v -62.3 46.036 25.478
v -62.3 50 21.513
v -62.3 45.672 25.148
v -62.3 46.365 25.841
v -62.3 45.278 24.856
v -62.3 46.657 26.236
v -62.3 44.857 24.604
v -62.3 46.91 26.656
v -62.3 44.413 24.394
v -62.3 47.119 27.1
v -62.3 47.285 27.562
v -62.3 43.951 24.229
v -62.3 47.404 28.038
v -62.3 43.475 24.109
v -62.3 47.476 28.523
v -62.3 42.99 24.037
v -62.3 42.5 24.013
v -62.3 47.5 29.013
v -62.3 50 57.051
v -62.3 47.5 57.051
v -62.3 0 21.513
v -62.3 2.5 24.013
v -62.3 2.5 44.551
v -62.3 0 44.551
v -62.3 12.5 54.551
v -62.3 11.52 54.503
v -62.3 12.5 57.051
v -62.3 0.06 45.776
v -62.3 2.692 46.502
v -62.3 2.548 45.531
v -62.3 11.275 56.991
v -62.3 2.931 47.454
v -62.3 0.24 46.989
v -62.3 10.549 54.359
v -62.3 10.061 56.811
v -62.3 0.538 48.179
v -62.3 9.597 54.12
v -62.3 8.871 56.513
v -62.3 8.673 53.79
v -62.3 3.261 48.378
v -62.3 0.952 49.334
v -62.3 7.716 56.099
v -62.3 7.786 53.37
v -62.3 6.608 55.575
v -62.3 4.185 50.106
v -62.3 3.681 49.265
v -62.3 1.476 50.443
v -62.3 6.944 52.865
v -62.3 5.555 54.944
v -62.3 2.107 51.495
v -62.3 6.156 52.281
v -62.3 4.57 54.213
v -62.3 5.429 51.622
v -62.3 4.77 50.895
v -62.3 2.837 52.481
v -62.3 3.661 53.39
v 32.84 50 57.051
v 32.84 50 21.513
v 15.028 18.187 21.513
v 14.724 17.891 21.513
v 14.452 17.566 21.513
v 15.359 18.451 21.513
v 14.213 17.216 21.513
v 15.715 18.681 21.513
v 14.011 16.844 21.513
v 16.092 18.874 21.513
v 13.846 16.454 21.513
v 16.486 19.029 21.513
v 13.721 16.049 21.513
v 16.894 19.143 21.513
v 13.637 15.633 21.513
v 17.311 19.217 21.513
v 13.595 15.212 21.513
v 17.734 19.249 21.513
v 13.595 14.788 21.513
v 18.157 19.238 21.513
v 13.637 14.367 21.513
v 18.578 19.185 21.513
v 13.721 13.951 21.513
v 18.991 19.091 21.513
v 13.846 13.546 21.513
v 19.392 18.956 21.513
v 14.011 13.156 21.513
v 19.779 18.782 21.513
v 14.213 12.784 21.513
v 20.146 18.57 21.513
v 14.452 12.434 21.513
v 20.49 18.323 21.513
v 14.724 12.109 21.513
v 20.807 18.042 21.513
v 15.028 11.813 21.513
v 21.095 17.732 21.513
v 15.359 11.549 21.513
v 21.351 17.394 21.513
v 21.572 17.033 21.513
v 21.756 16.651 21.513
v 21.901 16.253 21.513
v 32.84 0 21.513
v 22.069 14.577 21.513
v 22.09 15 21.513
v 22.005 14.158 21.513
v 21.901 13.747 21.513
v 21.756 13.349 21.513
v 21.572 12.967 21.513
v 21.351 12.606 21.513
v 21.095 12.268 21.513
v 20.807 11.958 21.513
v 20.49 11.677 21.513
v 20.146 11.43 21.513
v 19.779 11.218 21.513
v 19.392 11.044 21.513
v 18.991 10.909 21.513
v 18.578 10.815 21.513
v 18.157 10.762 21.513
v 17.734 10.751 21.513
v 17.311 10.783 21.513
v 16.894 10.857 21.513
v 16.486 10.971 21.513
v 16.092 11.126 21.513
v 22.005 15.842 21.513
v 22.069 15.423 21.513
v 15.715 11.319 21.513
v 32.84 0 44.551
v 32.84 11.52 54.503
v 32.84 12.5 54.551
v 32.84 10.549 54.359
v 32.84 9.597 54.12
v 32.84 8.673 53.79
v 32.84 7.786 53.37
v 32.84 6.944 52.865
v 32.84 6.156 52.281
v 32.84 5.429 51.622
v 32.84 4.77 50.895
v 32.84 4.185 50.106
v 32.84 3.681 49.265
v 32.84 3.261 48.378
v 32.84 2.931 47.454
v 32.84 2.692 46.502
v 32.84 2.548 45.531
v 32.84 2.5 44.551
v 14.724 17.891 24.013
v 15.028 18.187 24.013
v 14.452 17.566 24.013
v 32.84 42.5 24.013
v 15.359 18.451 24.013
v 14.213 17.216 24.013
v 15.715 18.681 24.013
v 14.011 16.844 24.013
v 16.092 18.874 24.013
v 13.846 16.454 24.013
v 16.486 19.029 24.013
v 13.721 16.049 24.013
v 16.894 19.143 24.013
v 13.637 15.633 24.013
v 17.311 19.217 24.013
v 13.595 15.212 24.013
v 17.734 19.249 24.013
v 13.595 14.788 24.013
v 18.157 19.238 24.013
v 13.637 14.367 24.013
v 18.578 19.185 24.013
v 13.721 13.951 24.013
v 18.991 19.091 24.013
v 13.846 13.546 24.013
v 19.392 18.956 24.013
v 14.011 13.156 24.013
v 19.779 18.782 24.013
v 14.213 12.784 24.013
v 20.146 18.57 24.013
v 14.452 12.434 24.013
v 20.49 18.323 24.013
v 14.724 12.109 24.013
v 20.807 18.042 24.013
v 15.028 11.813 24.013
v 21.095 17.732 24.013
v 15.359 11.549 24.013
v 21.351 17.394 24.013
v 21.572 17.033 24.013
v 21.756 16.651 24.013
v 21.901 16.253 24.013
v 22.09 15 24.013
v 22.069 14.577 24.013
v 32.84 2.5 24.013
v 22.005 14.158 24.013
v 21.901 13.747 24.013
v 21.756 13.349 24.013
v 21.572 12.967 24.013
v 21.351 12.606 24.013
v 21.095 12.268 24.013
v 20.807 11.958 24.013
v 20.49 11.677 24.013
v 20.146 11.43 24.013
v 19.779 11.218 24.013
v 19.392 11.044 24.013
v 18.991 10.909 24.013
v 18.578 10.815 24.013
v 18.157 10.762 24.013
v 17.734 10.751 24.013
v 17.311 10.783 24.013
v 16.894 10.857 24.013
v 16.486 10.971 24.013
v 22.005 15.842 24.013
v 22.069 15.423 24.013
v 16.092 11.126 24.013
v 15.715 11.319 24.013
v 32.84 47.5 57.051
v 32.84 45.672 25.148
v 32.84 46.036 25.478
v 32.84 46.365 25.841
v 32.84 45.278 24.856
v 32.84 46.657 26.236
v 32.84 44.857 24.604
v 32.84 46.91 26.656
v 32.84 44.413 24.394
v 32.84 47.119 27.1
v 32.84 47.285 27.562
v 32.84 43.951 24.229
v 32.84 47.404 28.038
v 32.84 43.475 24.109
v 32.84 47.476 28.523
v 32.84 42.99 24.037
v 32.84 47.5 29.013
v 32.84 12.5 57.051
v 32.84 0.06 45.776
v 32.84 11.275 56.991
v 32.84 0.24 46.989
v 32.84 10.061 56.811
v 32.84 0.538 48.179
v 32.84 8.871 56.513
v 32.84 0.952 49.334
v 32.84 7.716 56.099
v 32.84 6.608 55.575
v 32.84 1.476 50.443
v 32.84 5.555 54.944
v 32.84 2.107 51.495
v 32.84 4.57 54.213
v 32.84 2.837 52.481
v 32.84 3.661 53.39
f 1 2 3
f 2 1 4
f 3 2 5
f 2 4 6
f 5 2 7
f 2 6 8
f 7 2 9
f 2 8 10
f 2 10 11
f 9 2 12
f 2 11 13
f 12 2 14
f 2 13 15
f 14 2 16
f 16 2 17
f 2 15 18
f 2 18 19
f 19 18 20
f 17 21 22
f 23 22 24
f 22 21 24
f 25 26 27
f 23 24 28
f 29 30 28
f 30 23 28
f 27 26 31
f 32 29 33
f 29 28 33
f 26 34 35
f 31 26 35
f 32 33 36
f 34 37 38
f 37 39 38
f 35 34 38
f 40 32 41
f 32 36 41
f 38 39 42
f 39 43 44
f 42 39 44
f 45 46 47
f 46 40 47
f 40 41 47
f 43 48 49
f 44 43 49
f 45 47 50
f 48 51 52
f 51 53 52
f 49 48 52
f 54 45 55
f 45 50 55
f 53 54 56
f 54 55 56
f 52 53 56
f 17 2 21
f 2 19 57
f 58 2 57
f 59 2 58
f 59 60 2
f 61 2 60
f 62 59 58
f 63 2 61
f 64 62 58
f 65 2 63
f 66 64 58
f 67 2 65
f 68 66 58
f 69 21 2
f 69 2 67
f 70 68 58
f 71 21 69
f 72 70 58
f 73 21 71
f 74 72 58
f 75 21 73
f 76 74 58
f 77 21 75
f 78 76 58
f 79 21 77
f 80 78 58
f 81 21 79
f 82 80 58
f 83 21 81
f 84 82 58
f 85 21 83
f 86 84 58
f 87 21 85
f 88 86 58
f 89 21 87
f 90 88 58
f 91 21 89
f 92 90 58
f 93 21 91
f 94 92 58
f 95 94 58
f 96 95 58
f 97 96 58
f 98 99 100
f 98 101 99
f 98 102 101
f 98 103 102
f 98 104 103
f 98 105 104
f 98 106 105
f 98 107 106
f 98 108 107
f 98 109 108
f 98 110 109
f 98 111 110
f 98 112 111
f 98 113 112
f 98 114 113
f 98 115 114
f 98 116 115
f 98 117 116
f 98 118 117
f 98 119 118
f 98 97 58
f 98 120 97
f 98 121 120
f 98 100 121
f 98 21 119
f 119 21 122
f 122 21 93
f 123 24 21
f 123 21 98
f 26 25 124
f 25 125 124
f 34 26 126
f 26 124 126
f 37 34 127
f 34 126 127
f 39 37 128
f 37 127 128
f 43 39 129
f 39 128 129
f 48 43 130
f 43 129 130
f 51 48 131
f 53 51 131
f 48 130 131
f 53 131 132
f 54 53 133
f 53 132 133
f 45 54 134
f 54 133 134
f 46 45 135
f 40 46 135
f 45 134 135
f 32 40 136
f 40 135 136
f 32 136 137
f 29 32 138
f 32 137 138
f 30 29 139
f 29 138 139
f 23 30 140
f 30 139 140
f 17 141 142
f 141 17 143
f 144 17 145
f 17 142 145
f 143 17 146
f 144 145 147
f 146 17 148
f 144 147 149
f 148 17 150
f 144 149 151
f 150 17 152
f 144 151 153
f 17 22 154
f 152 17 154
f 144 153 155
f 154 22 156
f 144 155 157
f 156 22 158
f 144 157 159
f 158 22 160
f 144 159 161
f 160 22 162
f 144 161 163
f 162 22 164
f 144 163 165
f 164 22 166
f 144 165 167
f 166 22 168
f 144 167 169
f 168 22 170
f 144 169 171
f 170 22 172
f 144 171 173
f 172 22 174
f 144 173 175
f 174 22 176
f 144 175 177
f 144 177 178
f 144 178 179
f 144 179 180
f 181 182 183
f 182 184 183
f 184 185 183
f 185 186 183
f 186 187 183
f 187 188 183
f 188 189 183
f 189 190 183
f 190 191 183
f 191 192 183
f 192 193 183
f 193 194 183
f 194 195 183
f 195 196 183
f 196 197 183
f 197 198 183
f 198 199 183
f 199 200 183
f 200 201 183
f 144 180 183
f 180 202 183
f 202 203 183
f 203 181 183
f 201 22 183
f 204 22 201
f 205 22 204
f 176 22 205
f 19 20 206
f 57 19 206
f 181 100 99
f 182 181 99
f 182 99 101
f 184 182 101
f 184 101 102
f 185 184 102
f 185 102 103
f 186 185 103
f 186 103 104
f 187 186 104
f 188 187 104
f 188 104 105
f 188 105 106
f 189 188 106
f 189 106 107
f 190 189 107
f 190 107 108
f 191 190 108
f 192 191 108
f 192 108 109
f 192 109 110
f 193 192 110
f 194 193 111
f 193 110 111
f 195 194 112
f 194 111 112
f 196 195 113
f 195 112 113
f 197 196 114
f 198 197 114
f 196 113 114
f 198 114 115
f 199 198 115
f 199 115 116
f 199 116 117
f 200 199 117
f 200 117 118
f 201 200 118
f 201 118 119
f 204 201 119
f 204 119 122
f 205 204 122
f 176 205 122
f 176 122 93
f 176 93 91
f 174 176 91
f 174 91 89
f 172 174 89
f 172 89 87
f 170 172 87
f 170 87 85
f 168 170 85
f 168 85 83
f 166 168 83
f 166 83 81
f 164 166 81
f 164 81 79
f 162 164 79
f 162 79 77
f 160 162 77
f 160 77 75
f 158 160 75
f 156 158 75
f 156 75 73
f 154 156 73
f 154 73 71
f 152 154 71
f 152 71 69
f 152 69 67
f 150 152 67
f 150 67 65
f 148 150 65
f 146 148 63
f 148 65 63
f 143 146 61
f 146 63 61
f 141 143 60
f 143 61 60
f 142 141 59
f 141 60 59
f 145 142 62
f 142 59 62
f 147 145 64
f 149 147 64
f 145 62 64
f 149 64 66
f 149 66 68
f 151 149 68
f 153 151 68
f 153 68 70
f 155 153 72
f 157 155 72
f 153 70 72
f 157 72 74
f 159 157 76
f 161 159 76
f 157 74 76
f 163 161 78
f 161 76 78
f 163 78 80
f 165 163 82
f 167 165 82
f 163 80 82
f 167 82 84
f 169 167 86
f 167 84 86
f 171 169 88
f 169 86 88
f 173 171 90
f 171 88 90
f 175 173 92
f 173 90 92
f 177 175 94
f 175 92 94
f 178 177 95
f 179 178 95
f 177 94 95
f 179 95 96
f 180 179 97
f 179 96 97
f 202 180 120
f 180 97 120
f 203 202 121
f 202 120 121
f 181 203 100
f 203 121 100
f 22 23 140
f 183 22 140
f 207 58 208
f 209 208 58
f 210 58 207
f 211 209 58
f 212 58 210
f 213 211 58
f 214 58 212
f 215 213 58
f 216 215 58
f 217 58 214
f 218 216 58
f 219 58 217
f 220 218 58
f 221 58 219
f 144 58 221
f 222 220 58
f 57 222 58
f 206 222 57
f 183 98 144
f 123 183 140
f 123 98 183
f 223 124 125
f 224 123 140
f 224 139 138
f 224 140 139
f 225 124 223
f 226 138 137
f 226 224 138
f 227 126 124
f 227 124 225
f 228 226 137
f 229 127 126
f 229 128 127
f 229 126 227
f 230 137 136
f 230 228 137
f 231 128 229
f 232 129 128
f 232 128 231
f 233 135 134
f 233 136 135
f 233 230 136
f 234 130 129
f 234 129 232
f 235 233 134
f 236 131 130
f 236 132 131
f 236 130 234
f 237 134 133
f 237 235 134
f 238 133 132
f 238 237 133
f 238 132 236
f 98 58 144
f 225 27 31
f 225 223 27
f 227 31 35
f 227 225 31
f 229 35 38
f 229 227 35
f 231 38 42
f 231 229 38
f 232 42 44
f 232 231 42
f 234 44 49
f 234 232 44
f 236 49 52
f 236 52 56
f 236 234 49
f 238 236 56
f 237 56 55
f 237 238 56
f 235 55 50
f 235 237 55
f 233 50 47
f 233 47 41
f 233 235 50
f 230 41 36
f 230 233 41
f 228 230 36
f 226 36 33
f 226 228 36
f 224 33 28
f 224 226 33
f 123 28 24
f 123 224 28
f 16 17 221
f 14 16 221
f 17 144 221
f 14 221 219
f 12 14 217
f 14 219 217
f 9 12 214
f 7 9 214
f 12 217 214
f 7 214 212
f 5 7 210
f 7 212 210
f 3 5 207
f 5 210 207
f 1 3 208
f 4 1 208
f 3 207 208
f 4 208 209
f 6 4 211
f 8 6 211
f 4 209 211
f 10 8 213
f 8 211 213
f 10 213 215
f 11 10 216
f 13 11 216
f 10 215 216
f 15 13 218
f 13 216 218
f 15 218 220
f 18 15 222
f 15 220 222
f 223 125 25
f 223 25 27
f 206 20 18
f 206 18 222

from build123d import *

# Parameters (mm, degrees)
F0_W     = 95.1395854354
F0_H     = 35.537417978
F1_DEPTH = 50
F2_R     = 12.5
F3_T     = 2.5
F4_R     = 5
F5_R     = 4.25
F6_DEPTH = 25


# Not quite as in the source:
# - a shell that OpenCascade refuses in one call is made with other operations: the cavity is built on its own and cut out


with BuildPart() as f1:
    # F0 (on Front) → F1 (new body)
    with BuildSketch(Plane.XZ):
        with Locations((-14.7300325334, 39.2820779234)):
            Rectangle(F0_W, F0_H)
    extrude(amount=-F1_DEPTH)

    # F2
    f2_edges = [f1.edges().sort_by_distance(p)[0] for p in [
        (-14.730033, 0, 57.050787),
    ]]
    fillet(f2_edges, radius=F2_R)

    # F3: shell of thickness 2.5, made by hand


with BuildPart() as f3_core1:
    # F3_t2: copy of F1
    add(f1.part)

    # the walls: a layer under each face that stays
    f3_faces = [f3_core1.faces().sort_by_distance(p)[0] for p in [
        (-14.7300325334, 3.6611652352, 53.3896216773),
        (-14.7300325334, 50, 39.2820779234),
        (-14.7300325334, 0, 33.0320779234),
        (-14.7300325334, 25, 21.5133689344),
    ]]
    thicken(f3_faces, amount=-F3_T, mode=Mode.SUBTRACT)


with BuildPart() as f1_1:
    add(f1.part)

    # what is left inside the walls is the cavity
    f3_cavity = [f3_core1.part.solids().sort_by_distance(p)[0] for p in [
        (-14.730033, 32.5, 24.038369),
    ]]
    add(f3_cavity, mode=Mode.SUBTRACT)

    # F4
    f4_edges = [f1_1.edges().sort_by_distance(p)[0] for p in [
        (-14.730033, 47.5, 24.013369),
    ]]
    fillet(f4_edges, radius=F4_R)

    # F5 (on face) → F6 (cut)
    with BuildSketch(Plane(origin=(0, 0, 21.5133689344), x_dir=(1, 0, 0), z_dir=(0, 0, -1))):
        with Locations((17.8397601843, -15)):
            Circle(F5_R)
    extrude(amount=-F6_DEPTH, mode=Mode.SUBTRACT)


solid = f1_1.part
